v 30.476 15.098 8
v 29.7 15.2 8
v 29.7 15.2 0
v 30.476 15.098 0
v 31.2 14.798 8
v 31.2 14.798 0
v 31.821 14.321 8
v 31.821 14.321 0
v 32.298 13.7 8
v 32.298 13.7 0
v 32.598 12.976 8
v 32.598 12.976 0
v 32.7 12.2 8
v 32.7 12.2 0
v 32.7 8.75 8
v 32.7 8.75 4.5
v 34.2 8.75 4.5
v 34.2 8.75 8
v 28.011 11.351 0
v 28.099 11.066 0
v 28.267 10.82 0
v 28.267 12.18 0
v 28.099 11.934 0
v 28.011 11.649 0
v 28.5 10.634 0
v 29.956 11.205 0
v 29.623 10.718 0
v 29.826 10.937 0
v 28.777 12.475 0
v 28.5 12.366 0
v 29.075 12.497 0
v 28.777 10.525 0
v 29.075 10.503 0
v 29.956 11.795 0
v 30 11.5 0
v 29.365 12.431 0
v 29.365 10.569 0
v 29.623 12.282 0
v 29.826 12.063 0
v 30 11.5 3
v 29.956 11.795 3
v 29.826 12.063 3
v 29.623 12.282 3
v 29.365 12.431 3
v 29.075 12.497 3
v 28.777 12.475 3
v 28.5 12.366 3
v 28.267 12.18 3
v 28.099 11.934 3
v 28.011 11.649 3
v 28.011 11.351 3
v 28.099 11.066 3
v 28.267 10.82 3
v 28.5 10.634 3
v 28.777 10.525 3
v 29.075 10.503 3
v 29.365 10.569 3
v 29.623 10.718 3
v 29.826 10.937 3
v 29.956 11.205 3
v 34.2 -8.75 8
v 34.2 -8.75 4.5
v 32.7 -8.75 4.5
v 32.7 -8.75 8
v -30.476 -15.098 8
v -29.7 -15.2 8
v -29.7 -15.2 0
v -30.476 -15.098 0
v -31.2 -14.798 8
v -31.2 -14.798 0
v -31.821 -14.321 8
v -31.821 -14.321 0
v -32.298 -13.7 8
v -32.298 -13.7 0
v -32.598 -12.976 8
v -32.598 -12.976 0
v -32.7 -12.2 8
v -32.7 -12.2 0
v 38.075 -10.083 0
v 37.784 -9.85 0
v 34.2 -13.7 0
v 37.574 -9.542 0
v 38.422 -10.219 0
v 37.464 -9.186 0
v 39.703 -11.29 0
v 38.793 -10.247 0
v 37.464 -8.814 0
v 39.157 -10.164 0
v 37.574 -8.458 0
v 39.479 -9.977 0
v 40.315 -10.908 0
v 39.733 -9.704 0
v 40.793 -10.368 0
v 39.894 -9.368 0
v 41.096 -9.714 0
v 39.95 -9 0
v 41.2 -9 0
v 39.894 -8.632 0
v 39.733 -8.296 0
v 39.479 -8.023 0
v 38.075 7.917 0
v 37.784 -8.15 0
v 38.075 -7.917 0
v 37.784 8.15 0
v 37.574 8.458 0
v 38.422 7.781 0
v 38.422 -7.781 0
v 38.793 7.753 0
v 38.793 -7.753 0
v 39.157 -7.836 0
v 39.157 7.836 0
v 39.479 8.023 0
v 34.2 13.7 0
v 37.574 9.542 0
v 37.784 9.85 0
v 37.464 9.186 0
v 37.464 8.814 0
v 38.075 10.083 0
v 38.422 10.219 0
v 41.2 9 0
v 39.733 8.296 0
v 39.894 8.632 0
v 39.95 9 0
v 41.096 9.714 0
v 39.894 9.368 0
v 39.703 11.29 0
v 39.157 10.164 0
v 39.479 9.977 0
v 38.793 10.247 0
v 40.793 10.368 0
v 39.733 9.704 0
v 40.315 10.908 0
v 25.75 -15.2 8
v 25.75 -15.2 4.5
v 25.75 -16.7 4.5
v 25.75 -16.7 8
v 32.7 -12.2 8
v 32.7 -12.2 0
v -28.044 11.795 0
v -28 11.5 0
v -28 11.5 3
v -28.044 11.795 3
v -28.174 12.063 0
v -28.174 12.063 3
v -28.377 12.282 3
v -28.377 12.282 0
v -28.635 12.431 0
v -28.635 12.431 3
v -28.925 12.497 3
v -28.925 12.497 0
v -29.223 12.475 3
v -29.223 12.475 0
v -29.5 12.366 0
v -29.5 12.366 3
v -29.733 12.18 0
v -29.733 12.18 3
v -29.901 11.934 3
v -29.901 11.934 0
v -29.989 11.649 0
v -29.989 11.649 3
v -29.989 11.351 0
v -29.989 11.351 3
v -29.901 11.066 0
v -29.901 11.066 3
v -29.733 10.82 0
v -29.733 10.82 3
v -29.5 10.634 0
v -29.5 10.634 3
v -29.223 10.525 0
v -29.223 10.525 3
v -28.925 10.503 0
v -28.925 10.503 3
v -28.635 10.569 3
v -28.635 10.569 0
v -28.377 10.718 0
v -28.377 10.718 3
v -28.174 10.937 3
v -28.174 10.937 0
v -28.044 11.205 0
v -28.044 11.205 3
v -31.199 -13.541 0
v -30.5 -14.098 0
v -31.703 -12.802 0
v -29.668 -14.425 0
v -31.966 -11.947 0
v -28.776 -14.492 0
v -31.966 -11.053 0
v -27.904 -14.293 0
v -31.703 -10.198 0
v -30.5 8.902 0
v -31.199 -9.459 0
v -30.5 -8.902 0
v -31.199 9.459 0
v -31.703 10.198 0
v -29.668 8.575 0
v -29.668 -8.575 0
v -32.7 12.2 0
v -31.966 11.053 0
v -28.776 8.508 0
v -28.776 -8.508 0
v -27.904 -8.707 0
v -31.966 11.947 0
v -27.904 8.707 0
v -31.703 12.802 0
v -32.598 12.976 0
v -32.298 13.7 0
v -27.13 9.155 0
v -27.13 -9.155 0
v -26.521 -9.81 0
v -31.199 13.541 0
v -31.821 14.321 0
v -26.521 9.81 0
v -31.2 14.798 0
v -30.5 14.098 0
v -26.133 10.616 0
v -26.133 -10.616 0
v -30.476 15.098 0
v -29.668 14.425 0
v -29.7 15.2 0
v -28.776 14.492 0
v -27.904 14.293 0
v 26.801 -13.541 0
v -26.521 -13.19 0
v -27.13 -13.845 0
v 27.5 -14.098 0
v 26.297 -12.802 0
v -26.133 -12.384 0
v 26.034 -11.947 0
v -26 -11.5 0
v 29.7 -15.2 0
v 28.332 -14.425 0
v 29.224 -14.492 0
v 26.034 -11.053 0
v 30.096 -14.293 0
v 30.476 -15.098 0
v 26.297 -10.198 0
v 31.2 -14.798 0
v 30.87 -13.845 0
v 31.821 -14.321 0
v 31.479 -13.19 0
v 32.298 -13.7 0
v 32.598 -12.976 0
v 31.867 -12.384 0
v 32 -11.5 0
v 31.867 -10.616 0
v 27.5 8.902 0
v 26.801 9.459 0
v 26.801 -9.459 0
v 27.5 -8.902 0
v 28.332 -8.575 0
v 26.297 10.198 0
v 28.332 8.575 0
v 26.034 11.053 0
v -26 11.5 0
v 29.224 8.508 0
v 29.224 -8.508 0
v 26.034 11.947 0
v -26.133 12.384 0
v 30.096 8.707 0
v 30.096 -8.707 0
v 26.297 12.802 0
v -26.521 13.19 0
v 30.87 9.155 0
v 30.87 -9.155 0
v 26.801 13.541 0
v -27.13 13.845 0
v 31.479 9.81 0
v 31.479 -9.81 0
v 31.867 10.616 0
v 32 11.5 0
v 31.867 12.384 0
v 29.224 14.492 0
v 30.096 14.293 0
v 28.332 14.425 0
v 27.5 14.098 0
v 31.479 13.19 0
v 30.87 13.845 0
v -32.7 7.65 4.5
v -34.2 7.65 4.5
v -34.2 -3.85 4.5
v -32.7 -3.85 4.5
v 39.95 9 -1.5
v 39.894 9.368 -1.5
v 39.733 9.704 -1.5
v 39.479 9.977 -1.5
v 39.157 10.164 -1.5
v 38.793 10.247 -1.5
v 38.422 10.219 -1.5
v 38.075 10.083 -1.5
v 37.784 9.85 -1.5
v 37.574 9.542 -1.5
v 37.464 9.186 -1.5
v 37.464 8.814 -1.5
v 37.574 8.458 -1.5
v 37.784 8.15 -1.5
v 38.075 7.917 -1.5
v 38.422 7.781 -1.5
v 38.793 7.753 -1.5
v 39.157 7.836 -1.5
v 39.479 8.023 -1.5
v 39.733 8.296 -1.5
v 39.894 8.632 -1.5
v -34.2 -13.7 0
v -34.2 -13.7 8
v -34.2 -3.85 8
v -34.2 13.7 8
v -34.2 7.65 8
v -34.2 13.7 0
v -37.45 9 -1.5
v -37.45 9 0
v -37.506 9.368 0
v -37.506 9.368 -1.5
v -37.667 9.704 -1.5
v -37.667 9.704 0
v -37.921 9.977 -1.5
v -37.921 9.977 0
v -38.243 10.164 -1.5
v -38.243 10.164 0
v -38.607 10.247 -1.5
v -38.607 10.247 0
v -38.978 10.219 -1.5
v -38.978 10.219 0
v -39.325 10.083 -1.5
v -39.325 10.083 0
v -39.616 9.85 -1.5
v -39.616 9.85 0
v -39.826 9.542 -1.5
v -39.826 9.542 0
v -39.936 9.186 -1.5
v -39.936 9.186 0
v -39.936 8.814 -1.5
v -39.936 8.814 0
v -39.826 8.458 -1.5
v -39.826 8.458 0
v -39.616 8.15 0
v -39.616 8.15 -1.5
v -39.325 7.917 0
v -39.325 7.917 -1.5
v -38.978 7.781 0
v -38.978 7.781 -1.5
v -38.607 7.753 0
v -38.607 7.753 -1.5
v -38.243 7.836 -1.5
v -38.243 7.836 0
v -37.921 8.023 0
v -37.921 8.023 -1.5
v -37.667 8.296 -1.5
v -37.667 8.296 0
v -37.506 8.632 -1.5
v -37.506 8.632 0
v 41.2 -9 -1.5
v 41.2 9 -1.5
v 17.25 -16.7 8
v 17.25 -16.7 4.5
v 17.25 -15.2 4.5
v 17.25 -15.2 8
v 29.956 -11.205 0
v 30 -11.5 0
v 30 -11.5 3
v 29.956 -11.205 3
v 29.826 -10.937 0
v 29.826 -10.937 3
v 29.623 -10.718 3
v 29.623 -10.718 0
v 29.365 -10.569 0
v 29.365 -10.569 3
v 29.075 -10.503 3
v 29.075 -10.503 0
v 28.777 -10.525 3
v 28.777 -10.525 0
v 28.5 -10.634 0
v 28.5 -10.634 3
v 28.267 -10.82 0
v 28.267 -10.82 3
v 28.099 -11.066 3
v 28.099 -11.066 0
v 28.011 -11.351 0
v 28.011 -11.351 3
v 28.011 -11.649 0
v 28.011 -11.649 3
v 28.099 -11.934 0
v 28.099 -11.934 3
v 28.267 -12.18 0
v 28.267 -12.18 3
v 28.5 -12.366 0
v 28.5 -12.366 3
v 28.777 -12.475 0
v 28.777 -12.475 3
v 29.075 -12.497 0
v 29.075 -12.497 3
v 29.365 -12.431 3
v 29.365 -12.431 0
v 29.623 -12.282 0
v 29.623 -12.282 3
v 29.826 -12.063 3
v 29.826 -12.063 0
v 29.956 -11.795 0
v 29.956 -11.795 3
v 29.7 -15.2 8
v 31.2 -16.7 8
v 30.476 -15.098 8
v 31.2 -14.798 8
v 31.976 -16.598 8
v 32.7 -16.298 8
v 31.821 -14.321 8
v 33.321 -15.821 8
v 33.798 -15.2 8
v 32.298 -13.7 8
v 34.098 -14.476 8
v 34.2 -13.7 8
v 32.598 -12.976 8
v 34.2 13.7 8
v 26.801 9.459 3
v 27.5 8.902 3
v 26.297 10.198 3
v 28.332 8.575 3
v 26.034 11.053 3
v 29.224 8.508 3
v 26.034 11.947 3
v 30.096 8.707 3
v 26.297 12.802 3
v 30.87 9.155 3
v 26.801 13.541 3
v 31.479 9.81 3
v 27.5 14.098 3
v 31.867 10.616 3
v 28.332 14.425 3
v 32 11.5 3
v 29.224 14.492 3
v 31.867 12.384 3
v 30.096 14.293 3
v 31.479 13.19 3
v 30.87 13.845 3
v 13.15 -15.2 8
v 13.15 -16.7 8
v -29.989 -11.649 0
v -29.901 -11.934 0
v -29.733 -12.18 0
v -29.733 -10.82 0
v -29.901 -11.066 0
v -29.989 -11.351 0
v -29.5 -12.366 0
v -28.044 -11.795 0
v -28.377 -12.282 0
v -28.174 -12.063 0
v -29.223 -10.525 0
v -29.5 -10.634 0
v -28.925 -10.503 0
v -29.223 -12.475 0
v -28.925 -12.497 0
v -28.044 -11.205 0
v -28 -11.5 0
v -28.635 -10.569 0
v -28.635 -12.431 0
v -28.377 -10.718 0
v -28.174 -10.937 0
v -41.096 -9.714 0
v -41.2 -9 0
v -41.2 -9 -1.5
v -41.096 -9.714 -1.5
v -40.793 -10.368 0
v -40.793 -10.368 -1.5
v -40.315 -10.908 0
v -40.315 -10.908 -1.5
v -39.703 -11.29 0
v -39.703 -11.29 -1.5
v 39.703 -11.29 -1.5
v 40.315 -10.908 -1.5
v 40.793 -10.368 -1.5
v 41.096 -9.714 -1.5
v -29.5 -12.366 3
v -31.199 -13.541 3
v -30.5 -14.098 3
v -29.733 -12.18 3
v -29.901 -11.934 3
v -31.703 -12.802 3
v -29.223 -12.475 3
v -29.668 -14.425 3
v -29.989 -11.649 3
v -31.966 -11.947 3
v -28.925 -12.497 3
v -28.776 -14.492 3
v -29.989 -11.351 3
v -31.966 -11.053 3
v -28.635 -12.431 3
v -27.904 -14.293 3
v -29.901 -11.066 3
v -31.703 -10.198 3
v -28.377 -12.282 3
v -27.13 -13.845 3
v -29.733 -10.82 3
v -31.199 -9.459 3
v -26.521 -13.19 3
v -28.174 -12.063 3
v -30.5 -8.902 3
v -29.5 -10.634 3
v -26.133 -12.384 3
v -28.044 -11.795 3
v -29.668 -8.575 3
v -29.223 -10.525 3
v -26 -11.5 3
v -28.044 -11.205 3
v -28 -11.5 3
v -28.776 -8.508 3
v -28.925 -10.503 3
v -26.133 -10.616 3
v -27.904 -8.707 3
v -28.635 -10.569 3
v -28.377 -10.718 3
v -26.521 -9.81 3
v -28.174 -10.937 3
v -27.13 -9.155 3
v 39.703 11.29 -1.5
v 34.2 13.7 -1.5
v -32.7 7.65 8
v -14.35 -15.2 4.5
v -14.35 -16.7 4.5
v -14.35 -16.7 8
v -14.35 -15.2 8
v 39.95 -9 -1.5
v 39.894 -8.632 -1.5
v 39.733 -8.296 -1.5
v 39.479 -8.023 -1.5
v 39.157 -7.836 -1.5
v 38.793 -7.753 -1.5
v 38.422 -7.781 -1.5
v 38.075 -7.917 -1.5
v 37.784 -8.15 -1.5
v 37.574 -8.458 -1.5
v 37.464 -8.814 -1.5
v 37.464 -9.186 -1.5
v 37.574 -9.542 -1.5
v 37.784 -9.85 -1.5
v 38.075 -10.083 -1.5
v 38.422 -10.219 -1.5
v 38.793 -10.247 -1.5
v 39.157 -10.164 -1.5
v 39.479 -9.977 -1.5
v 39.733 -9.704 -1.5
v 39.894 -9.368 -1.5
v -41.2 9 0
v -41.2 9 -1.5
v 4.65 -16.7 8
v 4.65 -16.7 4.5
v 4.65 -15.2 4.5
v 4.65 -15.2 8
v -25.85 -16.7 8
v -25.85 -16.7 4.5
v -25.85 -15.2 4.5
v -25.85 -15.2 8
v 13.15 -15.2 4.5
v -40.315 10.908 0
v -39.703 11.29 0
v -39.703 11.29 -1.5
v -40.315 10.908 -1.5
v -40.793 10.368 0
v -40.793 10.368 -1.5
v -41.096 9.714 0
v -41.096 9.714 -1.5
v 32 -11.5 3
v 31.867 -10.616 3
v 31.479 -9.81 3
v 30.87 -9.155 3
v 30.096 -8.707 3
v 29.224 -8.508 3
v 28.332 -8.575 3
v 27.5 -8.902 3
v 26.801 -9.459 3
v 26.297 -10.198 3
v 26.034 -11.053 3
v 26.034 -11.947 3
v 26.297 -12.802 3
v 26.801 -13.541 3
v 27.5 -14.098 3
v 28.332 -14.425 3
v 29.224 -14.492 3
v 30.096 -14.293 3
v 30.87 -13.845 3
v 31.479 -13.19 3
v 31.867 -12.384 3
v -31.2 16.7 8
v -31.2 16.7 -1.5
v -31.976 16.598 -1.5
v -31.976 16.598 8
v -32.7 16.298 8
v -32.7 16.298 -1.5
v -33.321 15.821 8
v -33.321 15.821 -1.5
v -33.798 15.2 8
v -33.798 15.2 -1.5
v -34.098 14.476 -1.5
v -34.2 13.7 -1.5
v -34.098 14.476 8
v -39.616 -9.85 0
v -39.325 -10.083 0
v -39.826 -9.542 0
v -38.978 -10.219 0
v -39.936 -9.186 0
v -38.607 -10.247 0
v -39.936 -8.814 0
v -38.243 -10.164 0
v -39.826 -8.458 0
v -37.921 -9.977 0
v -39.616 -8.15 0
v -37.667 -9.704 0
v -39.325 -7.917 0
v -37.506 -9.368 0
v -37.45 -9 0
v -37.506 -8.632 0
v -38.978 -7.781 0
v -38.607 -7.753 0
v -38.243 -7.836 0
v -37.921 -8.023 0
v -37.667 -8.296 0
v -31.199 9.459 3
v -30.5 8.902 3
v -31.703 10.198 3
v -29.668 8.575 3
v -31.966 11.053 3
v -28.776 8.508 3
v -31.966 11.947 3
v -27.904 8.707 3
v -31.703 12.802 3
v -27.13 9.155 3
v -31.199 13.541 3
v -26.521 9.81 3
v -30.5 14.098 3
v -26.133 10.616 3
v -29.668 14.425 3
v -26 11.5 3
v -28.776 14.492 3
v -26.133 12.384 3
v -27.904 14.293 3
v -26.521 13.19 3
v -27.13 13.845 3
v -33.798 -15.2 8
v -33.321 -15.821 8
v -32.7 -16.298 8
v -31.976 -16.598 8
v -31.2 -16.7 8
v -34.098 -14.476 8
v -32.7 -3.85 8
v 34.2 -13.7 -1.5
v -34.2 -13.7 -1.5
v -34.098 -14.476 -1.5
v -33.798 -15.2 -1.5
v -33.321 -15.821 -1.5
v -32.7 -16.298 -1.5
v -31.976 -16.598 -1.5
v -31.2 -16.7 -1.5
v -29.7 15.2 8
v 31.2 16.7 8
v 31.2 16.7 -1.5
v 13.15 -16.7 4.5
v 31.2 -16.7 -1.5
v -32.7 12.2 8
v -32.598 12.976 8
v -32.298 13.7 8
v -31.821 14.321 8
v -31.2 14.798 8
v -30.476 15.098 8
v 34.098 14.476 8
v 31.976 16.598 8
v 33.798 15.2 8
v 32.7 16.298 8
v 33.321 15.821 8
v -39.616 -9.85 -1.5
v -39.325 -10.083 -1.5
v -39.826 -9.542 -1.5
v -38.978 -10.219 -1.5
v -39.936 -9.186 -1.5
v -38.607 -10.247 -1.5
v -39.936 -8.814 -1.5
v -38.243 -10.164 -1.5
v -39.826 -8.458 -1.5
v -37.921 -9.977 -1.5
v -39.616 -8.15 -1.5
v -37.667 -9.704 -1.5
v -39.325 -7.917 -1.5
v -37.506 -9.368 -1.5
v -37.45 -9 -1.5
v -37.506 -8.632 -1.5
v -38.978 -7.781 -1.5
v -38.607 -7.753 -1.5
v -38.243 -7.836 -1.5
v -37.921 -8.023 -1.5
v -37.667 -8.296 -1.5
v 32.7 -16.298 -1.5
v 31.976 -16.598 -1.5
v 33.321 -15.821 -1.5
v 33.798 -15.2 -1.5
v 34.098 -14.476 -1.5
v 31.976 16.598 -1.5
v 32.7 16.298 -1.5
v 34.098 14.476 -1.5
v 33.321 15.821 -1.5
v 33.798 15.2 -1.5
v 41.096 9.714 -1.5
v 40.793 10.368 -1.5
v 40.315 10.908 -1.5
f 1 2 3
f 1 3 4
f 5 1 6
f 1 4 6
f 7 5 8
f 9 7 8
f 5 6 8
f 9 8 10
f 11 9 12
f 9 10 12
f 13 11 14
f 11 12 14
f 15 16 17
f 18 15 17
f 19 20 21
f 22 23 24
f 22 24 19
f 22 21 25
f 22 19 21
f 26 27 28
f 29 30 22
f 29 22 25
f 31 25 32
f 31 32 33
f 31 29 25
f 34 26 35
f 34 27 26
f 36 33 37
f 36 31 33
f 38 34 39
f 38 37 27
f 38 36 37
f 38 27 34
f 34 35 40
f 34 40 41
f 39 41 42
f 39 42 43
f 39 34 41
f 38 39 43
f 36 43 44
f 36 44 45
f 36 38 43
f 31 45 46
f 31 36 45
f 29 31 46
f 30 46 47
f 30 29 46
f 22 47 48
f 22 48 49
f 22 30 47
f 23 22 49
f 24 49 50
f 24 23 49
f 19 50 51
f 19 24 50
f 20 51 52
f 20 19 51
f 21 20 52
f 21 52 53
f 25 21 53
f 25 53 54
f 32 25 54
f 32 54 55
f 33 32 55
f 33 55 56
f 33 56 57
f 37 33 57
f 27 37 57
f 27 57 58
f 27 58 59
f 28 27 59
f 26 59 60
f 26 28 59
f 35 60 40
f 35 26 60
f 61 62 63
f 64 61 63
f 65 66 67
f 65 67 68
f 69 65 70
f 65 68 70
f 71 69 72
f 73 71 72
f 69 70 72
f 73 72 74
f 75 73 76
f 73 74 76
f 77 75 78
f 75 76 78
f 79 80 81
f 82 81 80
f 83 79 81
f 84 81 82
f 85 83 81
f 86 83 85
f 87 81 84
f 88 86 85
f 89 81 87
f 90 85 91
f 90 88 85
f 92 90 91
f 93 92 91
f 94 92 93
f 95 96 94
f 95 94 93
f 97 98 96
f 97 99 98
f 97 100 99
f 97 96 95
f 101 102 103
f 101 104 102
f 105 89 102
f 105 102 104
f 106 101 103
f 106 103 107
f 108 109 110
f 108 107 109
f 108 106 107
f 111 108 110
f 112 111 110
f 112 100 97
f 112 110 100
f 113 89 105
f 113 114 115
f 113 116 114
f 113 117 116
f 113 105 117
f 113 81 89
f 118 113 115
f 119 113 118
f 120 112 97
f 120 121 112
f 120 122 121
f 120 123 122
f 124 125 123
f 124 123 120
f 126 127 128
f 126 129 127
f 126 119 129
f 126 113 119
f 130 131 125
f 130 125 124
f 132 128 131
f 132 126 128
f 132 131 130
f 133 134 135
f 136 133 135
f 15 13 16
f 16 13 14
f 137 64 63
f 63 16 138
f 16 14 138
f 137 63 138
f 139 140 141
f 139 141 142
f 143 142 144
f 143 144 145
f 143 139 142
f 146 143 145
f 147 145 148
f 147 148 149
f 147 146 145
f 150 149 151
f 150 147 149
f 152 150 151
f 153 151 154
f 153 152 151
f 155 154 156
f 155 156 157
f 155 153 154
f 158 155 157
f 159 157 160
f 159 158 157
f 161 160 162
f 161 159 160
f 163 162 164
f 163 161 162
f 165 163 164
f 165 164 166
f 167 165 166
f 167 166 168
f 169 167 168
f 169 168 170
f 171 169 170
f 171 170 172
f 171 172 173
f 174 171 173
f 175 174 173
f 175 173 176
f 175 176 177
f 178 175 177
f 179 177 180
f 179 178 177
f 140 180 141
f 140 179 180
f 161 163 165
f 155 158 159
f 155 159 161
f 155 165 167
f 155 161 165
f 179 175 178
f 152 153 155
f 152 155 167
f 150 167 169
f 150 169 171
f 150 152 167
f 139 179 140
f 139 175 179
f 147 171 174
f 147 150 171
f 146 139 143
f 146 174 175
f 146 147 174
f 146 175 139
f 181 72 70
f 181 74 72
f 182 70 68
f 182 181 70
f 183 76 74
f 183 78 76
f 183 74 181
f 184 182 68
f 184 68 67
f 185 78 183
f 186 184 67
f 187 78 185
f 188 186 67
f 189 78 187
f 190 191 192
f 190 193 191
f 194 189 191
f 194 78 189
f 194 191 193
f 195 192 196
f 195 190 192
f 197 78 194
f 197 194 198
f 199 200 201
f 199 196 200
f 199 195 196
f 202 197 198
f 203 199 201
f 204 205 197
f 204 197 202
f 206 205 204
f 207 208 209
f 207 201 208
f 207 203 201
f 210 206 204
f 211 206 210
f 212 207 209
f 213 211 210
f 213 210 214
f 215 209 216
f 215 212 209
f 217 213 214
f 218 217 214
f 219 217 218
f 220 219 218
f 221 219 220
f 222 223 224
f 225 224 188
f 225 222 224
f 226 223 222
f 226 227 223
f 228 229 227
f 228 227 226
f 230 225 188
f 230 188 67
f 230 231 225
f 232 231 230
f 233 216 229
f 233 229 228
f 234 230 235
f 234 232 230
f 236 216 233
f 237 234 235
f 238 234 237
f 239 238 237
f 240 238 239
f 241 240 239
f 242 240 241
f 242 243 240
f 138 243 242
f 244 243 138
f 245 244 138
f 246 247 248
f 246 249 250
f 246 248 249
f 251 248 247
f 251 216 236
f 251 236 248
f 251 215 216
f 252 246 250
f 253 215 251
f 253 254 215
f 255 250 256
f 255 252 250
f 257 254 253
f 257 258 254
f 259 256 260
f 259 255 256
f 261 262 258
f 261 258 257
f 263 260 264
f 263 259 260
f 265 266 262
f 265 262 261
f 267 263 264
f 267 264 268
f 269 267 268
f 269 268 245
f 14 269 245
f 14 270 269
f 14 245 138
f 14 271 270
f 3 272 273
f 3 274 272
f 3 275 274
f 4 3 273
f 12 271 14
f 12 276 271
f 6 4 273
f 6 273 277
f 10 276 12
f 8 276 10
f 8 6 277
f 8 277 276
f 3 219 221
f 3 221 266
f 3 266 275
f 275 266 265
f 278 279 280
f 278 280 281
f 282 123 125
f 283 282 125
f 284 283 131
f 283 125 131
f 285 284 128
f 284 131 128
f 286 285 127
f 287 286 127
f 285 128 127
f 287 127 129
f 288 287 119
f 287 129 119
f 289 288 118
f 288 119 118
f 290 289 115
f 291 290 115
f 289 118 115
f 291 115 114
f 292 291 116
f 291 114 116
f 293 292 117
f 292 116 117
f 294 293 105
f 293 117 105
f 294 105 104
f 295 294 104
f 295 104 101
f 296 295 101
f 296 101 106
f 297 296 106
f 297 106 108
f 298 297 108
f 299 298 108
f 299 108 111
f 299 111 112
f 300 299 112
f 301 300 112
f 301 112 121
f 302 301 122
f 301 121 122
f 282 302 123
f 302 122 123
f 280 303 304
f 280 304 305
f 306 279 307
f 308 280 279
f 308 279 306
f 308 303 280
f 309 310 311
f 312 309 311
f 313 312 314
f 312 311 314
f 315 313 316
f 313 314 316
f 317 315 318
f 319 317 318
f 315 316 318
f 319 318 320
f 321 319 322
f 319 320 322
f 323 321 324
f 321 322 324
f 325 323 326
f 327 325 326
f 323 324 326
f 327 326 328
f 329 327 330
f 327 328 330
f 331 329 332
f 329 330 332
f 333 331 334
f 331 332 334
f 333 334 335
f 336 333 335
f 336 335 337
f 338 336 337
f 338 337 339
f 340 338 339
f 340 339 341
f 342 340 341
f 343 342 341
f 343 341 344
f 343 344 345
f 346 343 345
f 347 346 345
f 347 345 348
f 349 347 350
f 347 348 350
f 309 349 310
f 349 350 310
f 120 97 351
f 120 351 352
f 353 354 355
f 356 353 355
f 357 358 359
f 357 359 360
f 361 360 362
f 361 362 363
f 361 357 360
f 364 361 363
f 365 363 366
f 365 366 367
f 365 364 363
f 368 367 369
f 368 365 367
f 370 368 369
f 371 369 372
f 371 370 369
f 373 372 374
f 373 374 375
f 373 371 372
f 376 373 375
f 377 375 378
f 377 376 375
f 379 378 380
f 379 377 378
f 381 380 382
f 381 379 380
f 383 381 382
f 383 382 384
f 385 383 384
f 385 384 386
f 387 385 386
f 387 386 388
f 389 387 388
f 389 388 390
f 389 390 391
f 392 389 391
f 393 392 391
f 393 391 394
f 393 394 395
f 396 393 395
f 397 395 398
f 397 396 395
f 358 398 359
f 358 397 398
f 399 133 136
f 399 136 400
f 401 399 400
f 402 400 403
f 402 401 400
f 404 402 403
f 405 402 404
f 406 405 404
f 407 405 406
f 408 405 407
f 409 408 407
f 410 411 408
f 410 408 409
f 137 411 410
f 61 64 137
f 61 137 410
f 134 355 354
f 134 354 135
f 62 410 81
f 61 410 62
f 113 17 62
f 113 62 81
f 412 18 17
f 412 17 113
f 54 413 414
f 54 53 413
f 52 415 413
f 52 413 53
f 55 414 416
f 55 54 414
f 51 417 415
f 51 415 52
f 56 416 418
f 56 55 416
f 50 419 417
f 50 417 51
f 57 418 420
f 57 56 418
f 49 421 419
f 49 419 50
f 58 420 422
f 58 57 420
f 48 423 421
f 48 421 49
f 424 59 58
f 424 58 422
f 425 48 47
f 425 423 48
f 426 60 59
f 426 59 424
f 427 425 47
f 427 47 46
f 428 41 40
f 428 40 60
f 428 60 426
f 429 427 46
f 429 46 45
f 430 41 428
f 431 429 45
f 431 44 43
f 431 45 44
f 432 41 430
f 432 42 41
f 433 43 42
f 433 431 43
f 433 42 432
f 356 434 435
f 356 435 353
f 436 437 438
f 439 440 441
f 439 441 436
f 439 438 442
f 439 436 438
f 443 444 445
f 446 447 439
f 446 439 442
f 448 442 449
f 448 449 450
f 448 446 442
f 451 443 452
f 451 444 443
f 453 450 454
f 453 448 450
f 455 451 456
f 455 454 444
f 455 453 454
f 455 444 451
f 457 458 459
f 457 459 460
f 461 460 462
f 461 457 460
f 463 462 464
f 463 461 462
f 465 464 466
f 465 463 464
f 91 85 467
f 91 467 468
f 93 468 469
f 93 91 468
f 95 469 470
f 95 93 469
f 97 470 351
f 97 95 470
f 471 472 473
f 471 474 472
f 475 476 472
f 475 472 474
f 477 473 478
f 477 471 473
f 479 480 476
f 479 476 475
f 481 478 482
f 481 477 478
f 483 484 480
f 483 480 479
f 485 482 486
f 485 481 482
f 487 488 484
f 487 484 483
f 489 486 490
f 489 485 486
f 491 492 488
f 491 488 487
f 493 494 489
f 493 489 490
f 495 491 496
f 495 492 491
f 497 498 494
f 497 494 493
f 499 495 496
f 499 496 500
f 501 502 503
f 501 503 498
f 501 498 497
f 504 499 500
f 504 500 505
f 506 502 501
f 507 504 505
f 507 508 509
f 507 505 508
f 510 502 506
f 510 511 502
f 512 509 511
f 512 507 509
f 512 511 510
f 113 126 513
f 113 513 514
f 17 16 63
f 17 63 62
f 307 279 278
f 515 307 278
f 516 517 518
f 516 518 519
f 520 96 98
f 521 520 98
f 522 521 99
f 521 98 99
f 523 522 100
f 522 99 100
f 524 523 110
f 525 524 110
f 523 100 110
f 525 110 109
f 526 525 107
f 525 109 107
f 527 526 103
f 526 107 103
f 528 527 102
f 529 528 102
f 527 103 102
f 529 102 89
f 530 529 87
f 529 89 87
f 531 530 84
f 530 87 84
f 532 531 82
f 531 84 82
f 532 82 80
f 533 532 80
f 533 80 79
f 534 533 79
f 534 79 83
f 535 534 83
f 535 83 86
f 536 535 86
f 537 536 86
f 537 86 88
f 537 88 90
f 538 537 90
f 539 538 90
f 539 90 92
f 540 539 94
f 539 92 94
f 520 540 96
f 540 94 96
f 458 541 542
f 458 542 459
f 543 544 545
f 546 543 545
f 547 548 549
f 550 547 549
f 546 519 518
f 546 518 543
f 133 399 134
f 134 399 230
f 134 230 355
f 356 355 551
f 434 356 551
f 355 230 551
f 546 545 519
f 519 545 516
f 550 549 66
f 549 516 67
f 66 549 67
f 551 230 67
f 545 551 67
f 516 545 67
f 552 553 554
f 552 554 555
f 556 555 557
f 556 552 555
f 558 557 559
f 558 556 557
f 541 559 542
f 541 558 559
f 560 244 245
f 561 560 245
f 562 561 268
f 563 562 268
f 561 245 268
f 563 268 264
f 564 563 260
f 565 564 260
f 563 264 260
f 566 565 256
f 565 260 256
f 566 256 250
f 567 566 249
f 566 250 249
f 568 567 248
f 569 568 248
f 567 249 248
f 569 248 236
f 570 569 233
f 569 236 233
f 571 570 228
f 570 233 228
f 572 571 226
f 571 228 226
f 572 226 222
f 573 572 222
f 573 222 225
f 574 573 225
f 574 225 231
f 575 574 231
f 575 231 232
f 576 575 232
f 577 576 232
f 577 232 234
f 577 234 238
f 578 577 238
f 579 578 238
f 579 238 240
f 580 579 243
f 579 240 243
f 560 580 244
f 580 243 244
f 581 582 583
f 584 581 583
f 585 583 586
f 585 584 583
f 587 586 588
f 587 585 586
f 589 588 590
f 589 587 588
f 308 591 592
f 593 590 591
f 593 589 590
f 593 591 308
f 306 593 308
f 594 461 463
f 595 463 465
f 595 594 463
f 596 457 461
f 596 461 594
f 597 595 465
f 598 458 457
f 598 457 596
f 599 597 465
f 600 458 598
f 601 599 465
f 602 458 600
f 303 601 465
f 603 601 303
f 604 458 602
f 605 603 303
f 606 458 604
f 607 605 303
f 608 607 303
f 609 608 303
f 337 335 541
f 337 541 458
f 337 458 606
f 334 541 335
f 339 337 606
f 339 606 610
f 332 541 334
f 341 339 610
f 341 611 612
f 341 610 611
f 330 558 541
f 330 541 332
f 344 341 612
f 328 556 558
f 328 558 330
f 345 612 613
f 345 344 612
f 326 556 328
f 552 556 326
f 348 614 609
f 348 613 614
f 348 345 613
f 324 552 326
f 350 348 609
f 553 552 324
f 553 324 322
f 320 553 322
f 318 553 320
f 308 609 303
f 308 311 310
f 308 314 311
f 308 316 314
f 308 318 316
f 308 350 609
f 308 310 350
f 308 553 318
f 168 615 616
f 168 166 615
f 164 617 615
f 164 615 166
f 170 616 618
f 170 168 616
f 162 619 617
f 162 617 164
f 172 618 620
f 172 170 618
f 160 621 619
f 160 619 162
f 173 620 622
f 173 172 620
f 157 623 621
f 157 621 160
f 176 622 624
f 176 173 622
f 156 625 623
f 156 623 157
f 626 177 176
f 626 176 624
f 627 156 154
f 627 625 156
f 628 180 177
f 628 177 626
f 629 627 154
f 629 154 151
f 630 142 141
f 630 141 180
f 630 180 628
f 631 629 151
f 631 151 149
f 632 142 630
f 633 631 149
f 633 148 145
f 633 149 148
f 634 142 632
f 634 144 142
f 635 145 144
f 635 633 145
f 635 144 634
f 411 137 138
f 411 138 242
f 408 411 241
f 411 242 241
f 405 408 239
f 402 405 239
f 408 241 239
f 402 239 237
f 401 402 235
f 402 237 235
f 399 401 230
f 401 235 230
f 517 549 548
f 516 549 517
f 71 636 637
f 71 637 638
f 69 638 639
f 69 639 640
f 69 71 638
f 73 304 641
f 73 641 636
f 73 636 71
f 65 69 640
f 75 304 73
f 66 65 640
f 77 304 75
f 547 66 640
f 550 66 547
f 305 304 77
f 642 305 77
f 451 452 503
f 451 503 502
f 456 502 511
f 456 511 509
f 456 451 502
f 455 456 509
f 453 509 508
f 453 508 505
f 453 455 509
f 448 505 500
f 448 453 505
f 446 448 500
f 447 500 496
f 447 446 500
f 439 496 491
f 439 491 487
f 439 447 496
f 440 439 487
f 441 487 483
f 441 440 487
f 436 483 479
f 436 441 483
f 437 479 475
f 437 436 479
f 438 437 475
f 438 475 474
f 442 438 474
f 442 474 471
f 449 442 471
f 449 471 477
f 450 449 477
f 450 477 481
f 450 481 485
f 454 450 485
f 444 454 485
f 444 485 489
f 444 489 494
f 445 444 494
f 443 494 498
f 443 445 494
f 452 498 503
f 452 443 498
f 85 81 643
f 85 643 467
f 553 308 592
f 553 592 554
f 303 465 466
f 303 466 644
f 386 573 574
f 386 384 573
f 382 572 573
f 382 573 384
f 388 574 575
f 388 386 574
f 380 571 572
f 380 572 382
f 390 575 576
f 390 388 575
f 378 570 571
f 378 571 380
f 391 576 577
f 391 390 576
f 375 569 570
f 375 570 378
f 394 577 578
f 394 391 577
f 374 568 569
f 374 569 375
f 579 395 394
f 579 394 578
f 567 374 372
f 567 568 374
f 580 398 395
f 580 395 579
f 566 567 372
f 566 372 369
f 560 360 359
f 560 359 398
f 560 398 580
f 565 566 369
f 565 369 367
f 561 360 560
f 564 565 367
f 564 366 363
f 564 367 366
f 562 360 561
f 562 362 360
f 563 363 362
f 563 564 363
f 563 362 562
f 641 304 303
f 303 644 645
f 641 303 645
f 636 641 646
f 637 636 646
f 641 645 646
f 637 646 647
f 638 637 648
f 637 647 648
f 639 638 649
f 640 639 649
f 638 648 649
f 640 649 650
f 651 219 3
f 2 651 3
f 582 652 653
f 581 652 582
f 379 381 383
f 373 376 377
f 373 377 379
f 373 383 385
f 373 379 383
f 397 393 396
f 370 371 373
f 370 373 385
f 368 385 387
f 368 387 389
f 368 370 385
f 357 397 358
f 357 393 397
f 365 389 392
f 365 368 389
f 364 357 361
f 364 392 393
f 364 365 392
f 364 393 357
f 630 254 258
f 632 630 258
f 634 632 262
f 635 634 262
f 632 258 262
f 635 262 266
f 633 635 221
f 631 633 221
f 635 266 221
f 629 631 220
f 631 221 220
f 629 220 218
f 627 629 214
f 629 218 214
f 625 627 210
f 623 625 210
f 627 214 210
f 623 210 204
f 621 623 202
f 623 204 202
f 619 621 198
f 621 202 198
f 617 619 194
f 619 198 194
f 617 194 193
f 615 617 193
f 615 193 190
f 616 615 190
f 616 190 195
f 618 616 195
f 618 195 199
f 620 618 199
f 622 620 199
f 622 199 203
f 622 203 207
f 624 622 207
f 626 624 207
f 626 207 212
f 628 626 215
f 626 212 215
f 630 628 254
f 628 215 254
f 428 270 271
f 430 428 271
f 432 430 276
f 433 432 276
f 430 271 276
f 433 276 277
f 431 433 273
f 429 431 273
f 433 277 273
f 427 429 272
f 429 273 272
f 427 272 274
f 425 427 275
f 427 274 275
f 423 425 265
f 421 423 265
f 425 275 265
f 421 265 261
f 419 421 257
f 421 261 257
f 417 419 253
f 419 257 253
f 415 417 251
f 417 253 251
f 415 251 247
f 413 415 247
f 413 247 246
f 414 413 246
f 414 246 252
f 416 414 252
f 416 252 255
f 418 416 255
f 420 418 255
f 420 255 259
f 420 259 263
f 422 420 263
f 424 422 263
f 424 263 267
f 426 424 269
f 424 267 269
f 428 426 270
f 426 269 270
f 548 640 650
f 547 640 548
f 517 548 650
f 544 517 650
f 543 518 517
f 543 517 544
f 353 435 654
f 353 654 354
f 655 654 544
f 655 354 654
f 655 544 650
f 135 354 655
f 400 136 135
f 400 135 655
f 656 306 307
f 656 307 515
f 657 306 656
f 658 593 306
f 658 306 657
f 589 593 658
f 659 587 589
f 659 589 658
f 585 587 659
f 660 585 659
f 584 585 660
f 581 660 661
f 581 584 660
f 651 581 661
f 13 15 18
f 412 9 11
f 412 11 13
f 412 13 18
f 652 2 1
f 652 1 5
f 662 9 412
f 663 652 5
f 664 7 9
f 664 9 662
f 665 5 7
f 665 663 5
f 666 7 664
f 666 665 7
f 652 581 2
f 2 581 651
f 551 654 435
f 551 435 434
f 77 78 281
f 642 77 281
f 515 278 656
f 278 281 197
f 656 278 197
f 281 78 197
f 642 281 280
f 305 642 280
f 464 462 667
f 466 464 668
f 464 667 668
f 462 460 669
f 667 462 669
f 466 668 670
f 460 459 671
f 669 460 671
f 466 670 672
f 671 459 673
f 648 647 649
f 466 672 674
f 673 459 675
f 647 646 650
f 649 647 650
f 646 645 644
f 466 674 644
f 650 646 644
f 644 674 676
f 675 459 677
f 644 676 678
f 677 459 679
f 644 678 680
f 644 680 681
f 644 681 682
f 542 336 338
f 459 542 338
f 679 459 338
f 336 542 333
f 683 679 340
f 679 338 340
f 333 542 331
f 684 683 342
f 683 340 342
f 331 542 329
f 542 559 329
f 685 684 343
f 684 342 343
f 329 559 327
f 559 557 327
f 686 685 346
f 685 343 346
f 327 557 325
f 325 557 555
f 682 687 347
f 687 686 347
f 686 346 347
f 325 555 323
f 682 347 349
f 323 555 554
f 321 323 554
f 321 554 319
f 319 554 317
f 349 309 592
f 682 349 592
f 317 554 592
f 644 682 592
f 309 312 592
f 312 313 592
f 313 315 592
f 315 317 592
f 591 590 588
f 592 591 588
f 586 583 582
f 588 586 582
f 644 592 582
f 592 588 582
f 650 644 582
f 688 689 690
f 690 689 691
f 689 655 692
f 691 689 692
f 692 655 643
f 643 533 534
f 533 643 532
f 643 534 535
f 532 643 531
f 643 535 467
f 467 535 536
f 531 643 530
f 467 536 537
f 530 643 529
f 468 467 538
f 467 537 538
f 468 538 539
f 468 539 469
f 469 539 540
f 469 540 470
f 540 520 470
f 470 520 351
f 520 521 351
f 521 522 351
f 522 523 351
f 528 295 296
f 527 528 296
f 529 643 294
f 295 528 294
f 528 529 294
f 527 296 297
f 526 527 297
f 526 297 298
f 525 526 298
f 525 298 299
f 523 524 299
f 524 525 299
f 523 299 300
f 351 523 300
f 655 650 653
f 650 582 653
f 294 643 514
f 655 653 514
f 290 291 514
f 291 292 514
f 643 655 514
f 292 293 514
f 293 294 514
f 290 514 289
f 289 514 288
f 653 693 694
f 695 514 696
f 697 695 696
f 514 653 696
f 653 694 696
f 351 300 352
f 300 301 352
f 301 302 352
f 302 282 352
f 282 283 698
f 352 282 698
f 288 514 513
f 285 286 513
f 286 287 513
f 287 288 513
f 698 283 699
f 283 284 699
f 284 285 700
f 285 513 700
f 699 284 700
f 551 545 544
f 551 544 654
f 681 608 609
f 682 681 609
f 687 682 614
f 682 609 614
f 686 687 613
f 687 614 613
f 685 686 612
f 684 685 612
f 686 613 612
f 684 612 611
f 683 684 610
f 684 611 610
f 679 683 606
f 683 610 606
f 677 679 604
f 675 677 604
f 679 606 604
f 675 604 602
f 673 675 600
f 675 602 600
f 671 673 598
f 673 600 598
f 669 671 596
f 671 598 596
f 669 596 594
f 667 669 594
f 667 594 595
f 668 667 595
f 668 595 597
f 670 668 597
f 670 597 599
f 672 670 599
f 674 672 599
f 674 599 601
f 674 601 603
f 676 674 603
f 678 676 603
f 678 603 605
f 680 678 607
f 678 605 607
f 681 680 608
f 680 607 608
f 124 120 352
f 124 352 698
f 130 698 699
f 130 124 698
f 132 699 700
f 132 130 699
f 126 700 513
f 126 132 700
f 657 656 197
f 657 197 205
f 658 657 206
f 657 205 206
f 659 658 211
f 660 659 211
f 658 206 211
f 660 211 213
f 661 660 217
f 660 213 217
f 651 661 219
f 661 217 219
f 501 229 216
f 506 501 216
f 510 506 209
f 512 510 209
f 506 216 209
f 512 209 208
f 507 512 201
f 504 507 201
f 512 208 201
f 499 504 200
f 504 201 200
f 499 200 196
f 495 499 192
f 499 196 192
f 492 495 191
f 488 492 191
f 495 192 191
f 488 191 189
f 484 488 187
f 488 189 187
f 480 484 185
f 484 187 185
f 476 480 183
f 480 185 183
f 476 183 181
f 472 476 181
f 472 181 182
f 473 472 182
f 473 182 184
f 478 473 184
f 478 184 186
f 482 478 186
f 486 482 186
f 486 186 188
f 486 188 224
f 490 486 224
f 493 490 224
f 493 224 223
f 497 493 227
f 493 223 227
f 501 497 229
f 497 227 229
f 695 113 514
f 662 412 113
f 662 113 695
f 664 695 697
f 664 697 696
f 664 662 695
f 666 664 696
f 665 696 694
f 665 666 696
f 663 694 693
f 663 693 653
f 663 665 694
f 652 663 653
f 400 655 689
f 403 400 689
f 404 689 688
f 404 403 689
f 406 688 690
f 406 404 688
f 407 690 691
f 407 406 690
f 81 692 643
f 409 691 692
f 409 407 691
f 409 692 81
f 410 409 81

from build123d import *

# Parameters (mm, degrees)
F0_R     = 3
F0_W     = 19
F0_H     = 1.5
F0_R_2   = 1
F0_W_2   = 1.5
F0_H_2   = 17.5
F0_H_3   = 11.5
F0_W_3   = 11.5
F0_W_4   = 8.5
F0_W_5   = 4.1
F1_DEPTH = 1.5
F2_DEPTH = 3
F3_DEPTH = 8
F4_DEPTH = 4.5
F5_R     = 1.25
F6_DEPTH = 1.5


with BuildPart() as f1:
    # F0 (on Top) → F1 (new body)
    with BuildSketch(Plane.XY):
        with BuildLine():
            Line((29.7, 15.2), (-29.7, 15.2))
            ThreePointArc((-29.7, 15.2), (-31.8213203436, 14.3213203436), (-32.7, 12.2))
            Line((-32.7, 12.2), (-32.7, 7.65))
            Line((-32.7, 7.65), (-32.7, -3.85))
            Line((-32.7, -3.85), (-32.7, -12.2))
            ThreePointArc((-32.7, -12.2), (-31.8213203436, -14.3213203436), (-29.7, -15.2))
            Line((-29.7, -15.2), (-25.85, -15.2))
            Line((-25.85, -15.2), (-14.35, -15.2))
            Line((-14.35, -15.2), (4.65, -15.2))
            Line((4.65, -15.2), (13.15, -15.2))
            Line((13.15, -15.2), (17.25, -15.2))
            Line((17.25, -15.2), (25.75, -15.2))
            Line((25.75, -15.2), (29.7, -15.2))
            ThreePointArc((29.7, -15.2), (31.8213203436, -14.3213203436), (32.7, -12.2))
            Line((32.7, -12.2), (32.7, -8.75))
            Line((32.7, -8.75), (32.7, 8.75))
            Line((32.7, 8.75), (32.7, 12.2))
            ThreePointArc((32.7, 12.2), (31.8213203436, 14.3213203436), (29.7, 15.2))
        make_face()
        with Locations((-29, -11.5)):
            Circle(F0_R, mode=Mode.SUBTRACT)
        with Locations((29, -11.5)):
            Circle(F0_R, mode=Mode.SUBTRACT)
        with Locations((-29, 11.5)):
            Circle(F0_R, mode=Mode.SUBTRACT)
        with Locations((29, 11.5)):
            Circle(F0_R, mode=Mode.SUBTRACT)
        with BuildLine():
            ThreePointArc((-32.7, 12.2), (-31.8213203436, 14.3213203436), (-29.7, 15.2))
            Line((-29.7, 15.2), (29.7, 15.2))
            ThreePointArc((29.7, 15.2), (31.8213203436, 14.3213203436), (32.7, 12.2))
            Line((32.7, 12.2), (32.7, 8.75))
            Line((32.7, 8.75), (34.2, 8.75))
            Line((34.2, 8.75), (34.2, 13.7))
            ThreePointArc((34.2, 13.7), (33.3213203436, 15.8213203436), (31.2, 16.7))
            Line((31.2, 16.7), (-31.2, 16.7))
            ThreePointArc((-31.2, 16.7), (-33.3213203436, 15.8213203436), (-34.2, 13.7))
            Line((-34.2, 13.7), (-34.2, 7.65))
            Line((-34.2, 7.65), (-32.7, 7.65))
            Line((-32.7, 7.65), (-32.7, 12.2))
        make_face()
        with BuildLine():
            Line((-32.7, -12.2), (-32.7, -3.85))
            Line((-32.7, -3.85), (-34.2, -3.85))
            Line((-34.2, -3.85), (-34.2, -13.7))
            ThreePointArc((-34.2, -13.7), (-33.3213203436, -15.8213203436), (-31.2, -16.7))
            Line((-31.2, -16.7), (-25.85, -16.7))
            Line((-25.85, -16.7), (-25.85, -15.2))
            Line((-25.85, -15.2), (-29.7, -15.2))
            ThreePointArc((-29.7, -15.2), (-31.8213203436, -14.3213203436), (-32.7, -12.2))
        make_face()
        with Locations((-4.85, -15.95)):
            Rectangle(F0_W, F0_H)
        with Locations((-29, -11.5)):
            Circle(F0_R)
        with Locations((-29, -11.5)):
            Circle(F0_R_2, mode=Mode.SUBTRACT)
        with Locations((-29, 11.5)):
            Circle(F0_R)
        with Locations((-29, 11.5)):
            Circle(F0_R_2, mode=Mode.SUBTRACT)
        with Locations((29, -11.5)):
            Circle(F0_R)
        with Locations((29, -11.5)):
            Circle(F0_R_2, mode=Mode.SUBTRACT)
        with Locations((29, 11.5)):
            Circle(F0_R)
        with Locations((29, 11.5)):
            Circle(F0_R_2, mode=Mode.SUBTRACT)
        with Locations((33.45, 0)):
            Rectangle(F0_W_2, F0_H_2)
        with BuildLine():
            Line((34.2, -8.75), (32.7, -8.75))
            Line((32.7, -8.75), (32.7, -12.2))
            ThreePointArc((32.7, -12.2), (31.8213203436, -14.3213203436), (29.7, -15.2))
            Line((29.7, -15.2), (25.75, -15.2))
            Line((25.75, -15.2), (25.75, -16.7))
            Line((25.75, -16.7), (31.2, -16.7))
            ThreePointArc((31.2, -16.7), (33.3213203436, -15.8213203436), (34.2, -13.7))
            Line((34.2, -13.7), (34.2, -8.75))
        make_face()
        with Locations((-33.45, 1.9)):
            Rectangle(F0_W_2, F0_H_3)
        with Locations((-20.1, -15.95)):
            Rectangle(F0_W_3, F0_H)
        with Locations((21.5, -15.95)):
            Rectangle(F0_W_4, F0_H)
        with Locations((8.9, -15.95)):
            Rectangle(F0_W_4, F0_H)
        with Locations((15.2, -15.95)):
            Rectangle(F0_W_5, F0_H)
        with Locations((-29, -11.5)):
            Circle(F0_R_2)
        with Locations((-29, 11.5)):
            Circle(F0_R_2)
        with Locations((29, -11.5)):
            Circle(F0_R_2)
        with Locations((29, 11.5)):
            Circle(F0_R_2)
    extrude(amount=-F1_DEPTH)

    # F0 (on Top) → F2 (join)
    with BuildSketch(Plane.XY):
        with Locations((-29, 11.5)):
            Circle(F0_R)
        with Locations((-29, 11.5)):
            Circle(F0_R_2, mode=Mode.SUBTRACT)
        with Locations((-29, -11.5)):
            Circle(F0_R)
        with Locations((-29, -11.5)):
            Circle(F0_R_2, mode=Mode.SUBTRACT)
        with Locations((29, 11.5)):
            Circle(F0_R)
        with Locations((29, 11.5)):
            Circle(F0_R_2, mode=Mode.SUBTRACT)
        with Locations((29, -11.5)):
            Circle(F0_R)
        with Locations((29, -11.5)):
            Circle(F0_R_2, mode=Mode.SUBTRACT)
    extrude(amount=F2_DEPTH)

    # F0 (on Top) → F3 (join)
    with BuildSketch(Plane.XY):
        with BuildLine():
            Line((-32.7, -12.2), (-32.7, -3.85))
            Line((-32.7, -3.85), (-34.2, -3.85))
            Line((-34.2, -3.85), (-34.2, -13.7))
            ThreePointArc((-34.2, -13.7), (-33.3213203436, -15.8213203436), (-31.2, -16.7))
            Line((-31.2, -16.7), (-25.85, -16.7))
            Line((-25.85, -16.7), (-25.85, -15.2))
            Line((-25.85, -15.2), (-29.7, -15.2))
            ThreePointArc((-29.7, -15.2), (-31.8213203436, -14.3213203436), (-32.7, -12.2))
        make_face()
        with BuildLine():
            ThreePointArc((-32.7, 12.2), (-31.8213203436, 14.3213203436), (-29.7, 15.2))
            Line((-29.7, 15.2), (29.7, 15.2))
            ThreePointArc((29.7, 15.2), (31.8213203436, 14.3213203436), (32.7, 12.2))
            Line((32.7, 12.2), (32.7, 8.75))
            Line((32.7, 8.75), (34.2, 8.75))
            Line((34.2, 8.75), (34.2, 13.7))
            ThreePointArc((34.2, 13.7), (33.3213203436, 15.8213203436), (31.2, 16.7))
            Line((31.2, 16.7), (-31.2, 16.7))
            ThreePointArc((-31.2, 16.7), (-33.3213203436, 15.8213203436), (-34.2, 13.7))
            Line((-34.2, 13.7), (-34.2, 7.65))
            Line((-34.2, 7.65), (-32.7, 7.65))
            Line((-32.7, 7.65), (-32.7, 12.2))
        make_face()
        with Locations((-4.85, -15.95)):
            Rectangle(F0_W, F0_H)
        with Locations((15.2, -15.95)):
            Rectangle(F0_W_5, F0_H)
        with BuildLine():
            Line((34.2, -8.75), (32.7, -8.75))
            Line((32.7, -8.75), (32.7, -12.2))
            ThreePointArc((32.7, -12.2), (31.8213203436, -14.3213203436), (29.7, -15.2))
            Line((29.7, -15.2), (25.75, -15.2))
            Line((25.75, -15.2), (25.75, -16.7))
            Line((25.75, -16.7), (31.2, -16.7))
            ThreePointArc((31.2, -16.7), (33.3213203436, -15.8213203436), (34.2, -13.7))
            Line((34.2, -13.7), (34.2, -8.75))
        make_face()
    extrude(amount=F3_DEPTH)

    # F0 (on Top) → F4 (join)
    with BuildSketch(Plane.XY):
        with Locations((-33.45, 1.9)):
            Rectangle(F0_W_2, F0_H_3)
        with Locations((-20.1, -15.95)):
            Rectangle(F0_W_3, F0_H)
        with Locations((8.9, -15.95)):
            Rectangle(F0_W_4, F0_H)
        with Locations((21.5, -15.95)):
            Rectangle(F0_W_4, F0_H)
        with Locations((33.45, 0)):
            Rectangle(F0_W_2, F0_H_2)
    extrude(amount=F4_DEPTH)

    # F5 (on face) → F6 (join)
    with BuildSketch(Plane.XY):
        with BuildLine():
            Line((39.7029067074, 11.2900170603), (34.2, 13.7))
            Line((34.2, 13.7), (34.2, -13.7))
            Line((34.2, -13.7), (39.7029067074, -11.2900170603))
            ThreePointArc((39.7029067074, -11.2900170603), (36.607481569, -7.6320209739), (41.2, -9))
            Line((41.2, -9), (41.2, 9))
            ThreePointArc((41.2, 9), (36.607481569, 7.6320209739), (39.7029067074, 11.2900170603))
        make_face()
        with BuildLine():
            ThreePointArc((41.2, -9), (36.607481569, -7.6320209739), (39.7029067074, -11.2900170603))
            ThreePointArc((39.7029067074, -11.2900170603), (40.792518431, -10.3679790261), (41.2, -9))
        make_face()
        with Locations((38.7, -9)):
            Circle(F5_R, mode=Mode.SUBTRACT)
        with BuildLine():
            ThreePointArc((41.2, 9), (40.792518431, 10.3679790261), (39.7029067074, 11.2900170603))
            ThreePointArc((39.7029067074, 11.2900170603), (36.607481569, 7.6320209739), (41.2, 9))
        make_face()
        with Locations((38.7, 9)):
            Circle(F5_R, mode=Mode.SUBTRACT)
        with BuildLine():
            Line((-34.2, -13.7), (-34.2, 13.7))
            Line((-34.2, 13.7), (-39.7029067074, 11.2900170603))
            ThreePointArc((-39.7029067074, 11.2900170603), (-37.3320209739, 11.092518431), (-36.2, 9))
            ThreePointArc((-36.2, 9), (-38.7, 6.5), (-41.2, 9))
            Line((-41.2, 9), (-41.2, -9))
            ThreePointArc((-41.2, -9), (-38.7, -6.5), (-36.2, -9))
            ThreePointArc((-36.2, -9), (-37.3320209739, -11.092518431), (-39.7029067074, -11.2900170603))
            Line((-39.7029067074, -11.2900170603), (-34.2, -13.7))
        make_face()
        with BuildLine():
            ThreePointArc((-36.2, 9), (-37.3320209739, 11.092518431), (-39.7029067074, 11.2900170603))
            ThreePointArc((-39.7029067074, 11.2900170603), (-40.792518431, 10.3679790261), (-41.2, 9))
            ThreePointArc((-41.2, 9), (-38.7, 6.5), (-36.2, 9))
        make_face()
        with Locations((-38.7, 9)):
            Circle(F5_R, mode=Mode.SUBTRACT)
        with BuildLine():
            ThreePointArc((-41.2, -9), (-40.792518431, -10.3679790261), (-39.7029067074, -11.2900170603))
            ThreePointArc((-39.7029067074, -11.2900170603), (-37.3320209739, -11.092518431), (-36.2, -9))
            ThreePointArc((-36.2, -9), (-38.7, -6.5), (-41.2, -9))
        make_face()
        with Locations((-38.7, -9)):
            Circle(F5_R, mode=Mode.SUBTRACT)
    extrude(amount=-F6_DEPTH)


solid = f1.part
